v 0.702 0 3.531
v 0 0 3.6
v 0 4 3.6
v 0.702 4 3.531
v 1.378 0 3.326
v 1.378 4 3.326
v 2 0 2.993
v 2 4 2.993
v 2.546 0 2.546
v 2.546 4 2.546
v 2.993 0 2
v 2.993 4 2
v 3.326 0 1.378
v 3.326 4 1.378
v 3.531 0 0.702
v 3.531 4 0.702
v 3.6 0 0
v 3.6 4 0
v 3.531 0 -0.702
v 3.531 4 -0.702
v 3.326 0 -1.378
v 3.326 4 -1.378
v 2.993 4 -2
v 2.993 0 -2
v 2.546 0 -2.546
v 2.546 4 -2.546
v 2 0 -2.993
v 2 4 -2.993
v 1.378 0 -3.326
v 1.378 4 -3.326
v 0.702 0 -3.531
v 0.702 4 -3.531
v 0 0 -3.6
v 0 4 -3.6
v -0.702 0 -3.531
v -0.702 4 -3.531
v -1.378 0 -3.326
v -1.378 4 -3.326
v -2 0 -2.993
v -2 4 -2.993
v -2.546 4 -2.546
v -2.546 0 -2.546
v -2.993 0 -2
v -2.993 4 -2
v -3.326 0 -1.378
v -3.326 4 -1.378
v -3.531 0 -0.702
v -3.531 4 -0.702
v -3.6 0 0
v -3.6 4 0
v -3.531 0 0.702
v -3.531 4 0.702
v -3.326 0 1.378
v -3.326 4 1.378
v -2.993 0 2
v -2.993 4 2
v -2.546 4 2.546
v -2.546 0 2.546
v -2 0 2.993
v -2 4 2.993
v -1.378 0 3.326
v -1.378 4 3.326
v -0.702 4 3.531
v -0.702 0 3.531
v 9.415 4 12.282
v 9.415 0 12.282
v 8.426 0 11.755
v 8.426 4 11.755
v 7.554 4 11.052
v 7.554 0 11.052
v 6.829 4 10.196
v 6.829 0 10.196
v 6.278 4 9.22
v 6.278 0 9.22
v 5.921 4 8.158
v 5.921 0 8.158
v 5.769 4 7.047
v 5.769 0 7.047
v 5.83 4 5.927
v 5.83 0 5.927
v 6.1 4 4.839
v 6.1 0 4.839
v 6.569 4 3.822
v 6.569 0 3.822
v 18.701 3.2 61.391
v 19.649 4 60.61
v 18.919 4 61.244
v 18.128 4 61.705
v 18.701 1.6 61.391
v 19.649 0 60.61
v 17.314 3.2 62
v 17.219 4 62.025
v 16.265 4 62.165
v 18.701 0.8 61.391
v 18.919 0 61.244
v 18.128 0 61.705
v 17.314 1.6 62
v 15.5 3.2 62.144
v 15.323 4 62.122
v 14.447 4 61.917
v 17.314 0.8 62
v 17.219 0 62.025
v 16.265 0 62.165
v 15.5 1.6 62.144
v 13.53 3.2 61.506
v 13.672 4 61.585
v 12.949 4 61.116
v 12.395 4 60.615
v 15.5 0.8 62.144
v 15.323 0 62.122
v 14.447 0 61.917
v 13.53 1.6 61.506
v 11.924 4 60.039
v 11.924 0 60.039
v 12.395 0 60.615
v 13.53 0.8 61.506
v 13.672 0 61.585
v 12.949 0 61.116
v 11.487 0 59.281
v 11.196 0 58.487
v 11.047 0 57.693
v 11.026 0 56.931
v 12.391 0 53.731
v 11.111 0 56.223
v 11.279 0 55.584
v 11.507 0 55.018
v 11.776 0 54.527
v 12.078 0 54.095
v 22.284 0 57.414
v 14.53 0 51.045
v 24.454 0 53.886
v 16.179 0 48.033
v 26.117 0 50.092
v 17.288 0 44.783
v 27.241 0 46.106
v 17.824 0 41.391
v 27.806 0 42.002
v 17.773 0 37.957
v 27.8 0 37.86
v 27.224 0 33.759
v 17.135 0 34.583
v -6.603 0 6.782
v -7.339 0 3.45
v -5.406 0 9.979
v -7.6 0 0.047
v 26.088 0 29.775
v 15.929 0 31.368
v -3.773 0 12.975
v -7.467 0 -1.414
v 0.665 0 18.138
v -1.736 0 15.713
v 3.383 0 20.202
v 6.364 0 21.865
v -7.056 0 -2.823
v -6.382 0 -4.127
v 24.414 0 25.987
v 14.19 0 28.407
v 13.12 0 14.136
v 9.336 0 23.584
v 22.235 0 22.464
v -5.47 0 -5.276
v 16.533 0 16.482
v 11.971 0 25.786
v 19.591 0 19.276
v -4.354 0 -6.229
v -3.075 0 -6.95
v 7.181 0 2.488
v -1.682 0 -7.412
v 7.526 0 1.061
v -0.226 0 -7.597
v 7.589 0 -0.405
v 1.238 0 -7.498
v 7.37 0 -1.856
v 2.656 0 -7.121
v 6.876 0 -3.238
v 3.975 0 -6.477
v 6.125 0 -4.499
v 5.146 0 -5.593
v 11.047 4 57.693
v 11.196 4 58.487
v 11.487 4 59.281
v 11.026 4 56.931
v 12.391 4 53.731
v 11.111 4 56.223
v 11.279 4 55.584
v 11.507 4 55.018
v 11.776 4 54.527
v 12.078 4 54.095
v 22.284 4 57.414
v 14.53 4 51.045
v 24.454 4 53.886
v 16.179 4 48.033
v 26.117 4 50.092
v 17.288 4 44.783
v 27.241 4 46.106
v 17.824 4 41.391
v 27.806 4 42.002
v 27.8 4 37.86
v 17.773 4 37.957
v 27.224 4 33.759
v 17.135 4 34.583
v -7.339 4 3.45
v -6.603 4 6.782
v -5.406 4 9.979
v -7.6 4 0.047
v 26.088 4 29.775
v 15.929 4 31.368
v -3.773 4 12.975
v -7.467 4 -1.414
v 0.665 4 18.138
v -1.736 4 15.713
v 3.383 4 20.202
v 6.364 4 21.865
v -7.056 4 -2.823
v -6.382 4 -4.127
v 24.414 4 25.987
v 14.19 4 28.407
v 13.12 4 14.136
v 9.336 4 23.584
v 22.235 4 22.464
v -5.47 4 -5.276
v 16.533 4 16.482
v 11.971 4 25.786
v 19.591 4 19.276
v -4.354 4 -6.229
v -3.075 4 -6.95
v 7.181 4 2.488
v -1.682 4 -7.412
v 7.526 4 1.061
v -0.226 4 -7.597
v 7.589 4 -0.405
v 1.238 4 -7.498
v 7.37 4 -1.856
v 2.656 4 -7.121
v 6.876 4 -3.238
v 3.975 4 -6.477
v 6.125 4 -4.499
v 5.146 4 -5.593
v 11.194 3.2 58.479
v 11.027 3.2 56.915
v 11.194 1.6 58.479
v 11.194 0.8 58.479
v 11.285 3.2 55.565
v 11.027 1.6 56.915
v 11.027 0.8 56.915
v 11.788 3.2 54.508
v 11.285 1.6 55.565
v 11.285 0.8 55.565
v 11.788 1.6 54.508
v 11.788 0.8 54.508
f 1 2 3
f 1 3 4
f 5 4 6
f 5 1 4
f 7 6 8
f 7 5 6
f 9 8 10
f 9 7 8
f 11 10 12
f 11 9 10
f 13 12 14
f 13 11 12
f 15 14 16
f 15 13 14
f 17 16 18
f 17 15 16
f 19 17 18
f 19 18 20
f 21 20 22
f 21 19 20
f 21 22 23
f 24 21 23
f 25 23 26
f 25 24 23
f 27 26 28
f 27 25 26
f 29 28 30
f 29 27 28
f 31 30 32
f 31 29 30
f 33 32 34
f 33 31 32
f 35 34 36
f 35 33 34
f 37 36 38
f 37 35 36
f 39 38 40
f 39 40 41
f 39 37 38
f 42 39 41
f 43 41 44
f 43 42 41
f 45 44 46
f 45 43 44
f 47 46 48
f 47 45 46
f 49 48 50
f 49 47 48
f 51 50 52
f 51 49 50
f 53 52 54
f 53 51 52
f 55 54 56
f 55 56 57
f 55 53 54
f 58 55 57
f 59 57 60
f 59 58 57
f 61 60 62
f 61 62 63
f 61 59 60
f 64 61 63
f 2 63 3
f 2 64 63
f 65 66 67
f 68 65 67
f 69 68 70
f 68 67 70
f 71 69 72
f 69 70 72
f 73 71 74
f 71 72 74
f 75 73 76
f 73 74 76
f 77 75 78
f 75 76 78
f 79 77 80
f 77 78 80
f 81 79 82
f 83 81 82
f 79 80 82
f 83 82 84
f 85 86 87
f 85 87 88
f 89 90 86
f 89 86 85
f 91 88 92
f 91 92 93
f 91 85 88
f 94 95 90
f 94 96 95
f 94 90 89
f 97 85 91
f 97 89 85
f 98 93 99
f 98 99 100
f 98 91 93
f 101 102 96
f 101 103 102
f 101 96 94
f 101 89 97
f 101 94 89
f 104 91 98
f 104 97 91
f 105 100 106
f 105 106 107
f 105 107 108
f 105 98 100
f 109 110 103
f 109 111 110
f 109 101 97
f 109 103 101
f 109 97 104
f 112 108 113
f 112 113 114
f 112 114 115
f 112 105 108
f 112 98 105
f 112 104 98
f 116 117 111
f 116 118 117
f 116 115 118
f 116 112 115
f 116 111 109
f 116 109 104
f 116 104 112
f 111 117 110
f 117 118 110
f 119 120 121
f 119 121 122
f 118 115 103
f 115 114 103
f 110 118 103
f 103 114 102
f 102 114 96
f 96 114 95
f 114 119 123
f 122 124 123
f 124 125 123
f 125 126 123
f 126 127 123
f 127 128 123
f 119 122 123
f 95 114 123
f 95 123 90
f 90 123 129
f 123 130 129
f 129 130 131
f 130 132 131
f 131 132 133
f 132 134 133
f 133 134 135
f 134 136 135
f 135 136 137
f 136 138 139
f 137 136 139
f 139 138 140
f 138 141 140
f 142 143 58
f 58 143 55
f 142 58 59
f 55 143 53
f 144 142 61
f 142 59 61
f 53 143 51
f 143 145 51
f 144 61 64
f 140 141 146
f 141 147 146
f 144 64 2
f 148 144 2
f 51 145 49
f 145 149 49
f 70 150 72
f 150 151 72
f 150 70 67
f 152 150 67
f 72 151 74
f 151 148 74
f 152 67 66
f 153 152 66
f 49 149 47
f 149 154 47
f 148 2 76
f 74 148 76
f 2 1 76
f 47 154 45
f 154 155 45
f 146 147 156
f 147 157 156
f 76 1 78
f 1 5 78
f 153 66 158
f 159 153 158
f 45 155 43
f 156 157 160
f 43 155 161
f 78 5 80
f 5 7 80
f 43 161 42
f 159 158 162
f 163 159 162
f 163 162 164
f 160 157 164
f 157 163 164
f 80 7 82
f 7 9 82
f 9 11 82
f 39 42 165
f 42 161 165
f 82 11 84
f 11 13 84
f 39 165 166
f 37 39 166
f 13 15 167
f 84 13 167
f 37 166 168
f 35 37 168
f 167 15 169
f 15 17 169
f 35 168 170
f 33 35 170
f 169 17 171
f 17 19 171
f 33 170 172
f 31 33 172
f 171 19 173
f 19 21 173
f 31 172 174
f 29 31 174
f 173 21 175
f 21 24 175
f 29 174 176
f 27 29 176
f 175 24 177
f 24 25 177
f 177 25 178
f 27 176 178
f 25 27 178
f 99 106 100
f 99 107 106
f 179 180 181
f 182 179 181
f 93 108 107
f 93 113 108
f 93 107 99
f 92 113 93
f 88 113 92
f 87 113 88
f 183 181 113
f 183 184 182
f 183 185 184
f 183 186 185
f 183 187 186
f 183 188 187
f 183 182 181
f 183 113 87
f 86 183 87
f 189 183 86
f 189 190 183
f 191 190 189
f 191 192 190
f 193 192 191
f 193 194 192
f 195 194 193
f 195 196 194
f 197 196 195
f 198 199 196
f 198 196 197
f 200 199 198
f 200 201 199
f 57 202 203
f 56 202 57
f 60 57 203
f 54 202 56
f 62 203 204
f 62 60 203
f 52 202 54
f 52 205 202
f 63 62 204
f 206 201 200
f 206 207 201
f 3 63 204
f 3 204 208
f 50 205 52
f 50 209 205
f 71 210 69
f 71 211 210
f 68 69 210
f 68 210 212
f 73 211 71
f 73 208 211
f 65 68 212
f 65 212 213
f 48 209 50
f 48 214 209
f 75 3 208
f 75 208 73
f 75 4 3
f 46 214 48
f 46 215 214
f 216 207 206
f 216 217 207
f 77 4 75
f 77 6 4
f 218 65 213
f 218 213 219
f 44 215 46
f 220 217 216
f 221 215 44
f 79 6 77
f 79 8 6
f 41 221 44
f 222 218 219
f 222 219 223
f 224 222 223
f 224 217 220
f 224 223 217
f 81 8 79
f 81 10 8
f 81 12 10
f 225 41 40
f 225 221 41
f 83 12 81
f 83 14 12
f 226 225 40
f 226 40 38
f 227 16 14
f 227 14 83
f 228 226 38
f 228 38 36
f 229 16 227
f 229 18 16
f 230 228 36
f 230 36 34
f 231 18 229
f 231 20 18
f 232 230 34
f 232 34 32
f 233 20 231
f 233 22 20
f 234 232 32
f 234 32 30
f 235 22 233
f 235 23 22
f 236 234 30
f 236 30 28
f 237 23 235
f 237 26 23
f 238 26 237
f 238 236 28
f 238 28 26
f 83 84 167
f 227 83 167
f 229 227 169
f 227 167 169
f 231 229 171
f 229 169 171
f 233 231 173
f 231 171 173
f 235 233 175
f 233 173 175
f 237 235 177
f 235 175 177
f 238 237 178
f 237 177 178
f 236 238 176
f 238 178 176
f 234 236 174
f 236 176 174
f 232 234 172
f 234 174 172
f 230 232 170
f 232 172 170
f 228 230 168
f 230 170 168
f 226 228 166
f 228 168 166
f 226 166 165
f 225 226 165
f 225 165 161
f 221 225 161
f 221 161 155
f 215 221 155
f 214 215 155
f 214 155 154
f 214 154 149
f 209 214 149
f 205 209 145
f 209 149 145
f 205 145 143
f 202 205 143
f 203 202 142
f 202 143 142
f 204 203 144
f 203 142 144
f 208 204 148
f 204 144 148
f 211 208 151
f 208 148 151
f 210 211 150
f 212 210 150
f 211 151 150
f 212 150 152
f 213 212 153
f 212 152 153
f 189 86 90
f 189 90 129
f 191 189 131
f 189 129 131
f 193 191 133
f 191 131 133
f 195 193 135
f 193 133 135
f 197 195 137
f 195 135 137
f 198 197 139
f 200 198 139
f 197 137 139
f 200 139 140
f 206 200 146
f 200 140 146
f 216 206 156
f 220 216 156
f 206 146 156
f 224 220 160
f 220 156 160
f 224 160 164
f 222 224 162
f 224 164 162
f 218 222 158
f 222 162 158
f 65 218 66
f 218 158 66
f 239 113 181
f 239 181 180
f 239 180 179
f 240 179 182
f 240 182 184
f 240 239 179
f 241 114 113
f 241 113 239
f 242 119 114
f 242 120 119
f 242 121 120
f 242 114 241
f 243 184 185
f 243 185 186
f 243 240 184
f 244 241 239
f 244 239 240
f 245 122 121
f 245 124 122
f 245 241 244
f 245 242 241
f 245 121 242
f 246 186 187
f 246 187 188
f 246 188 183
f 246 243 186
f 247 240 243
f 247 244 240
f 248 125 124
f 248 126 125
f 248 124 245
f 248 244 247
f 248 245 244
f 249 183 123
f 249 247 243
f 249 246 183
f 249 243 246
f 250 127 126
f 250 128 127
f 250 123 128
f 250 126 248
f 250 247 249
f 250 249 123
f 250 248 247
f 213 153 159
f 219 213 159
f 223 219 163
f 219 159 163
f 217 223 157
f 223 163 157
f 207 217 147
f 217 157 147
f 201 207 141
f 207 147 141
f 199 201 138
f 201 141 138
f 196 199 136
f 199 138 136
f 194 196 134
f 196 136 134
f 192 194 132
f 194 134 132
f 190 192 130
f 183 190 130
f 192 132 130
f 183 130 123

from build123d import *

# Parameters (mm, degrees)
SKETCH1_R           = 3.6
BOSS_EXTRUDE1_DEPTH = 4
FILLET1_DEPTH       = 4


with BuildPart() as part:
    # Sketch1 → Boss-Extrude1 (new body)
    with BuildSketch(Plane(origin=(0, 0, 0), x_dir=(1, 0, 0), z_dir=(0, 1, 0))):
        with BuildLine():
            Line((9.346086984, -56.356572977), (15.081851343, -64.548093422))
            ThreePointArc((15.081851343, -64.548093422), (27.699790534, -36.740032424), (9.415453774, -12.282238674))
            ThreePointArc((9.415453774, -12.282238674), (6.074212989, -8.697213495), (6.569252548, -3.821638518))
            ThreePointArc((6.569252548, -3.821638518), (1.956261977, 7.343911701), (-7.599852871, -0.04729001))
            ThreePointArc((-7.599852871, -0.04729001), (-3.773263774, -12.975309302), (6.3636811, -21.864562113))
            ThreePointArc((6.3636811, -21.864562113), (17.800210223, -38.250629299), (9.346086984, -56.356572977))
        make_face()
        with Locations(Location((0, 0, 0), (0, 0, 270))):
            Circle(SKETCH1_R, mode=Mode.SUBTRACT)
    extrude(amount=BOSS_EXTRUDE1_DEPTH)

    # Fillet1: read off the stored shape, not the designer's step
    # Fillet1 outline → Fillet1 (cut)
    with BuildSketch(Plane(origin=(0, 0, 0), x_dir=(1, 0, 0), z_dir=(0, 1, 0))):
        with BuildLine():
            ThreePointArc((15.081851343, -64.548093422), (17.464679897, -62.694164436), (19.649105693, -60.610127838))
            add(Edge.make_bspline(
                [(19.649105693, -60.610127838), (18.677855173, -61.634935456), (17.188222286, -62.496348841), (15.223722909, -62.743763995), (13.23213393, -61.906423138), (11.924254263, -60.03857744)],
                knots=[0, 0, 0, 0, 0, 0, 0.550510254, 0.550510254, 0.550510254, 0.550510254, 0.550510254, 0.550510254], degree=5, weights=[1, 0.779795898, 0.620204104, 0.521224619, 0.482857441, 0.505102571]))
            Line((11.924254263, -60.03857744), (15.081851343, -64.548093422))
        make_face()
        with BuildLine():
            Line((9.346086984, -56.356572977), (11.924254263, -60.03857744))
            add(Edge.make_bspline(
                [(11.924254263, -60.03857744), (10.93883994, -58.631259971), (10.675135711, -57.05607025), (10.993827945, -55.636809597), (11.636969564, -54.526791063), (12.390923216, -53.731262588)],
                knots=[0.550510254, 0.550510254, 0.550510254, 0.550510254, 0.550510254, 0.550510254, 1, 1, 1, 1, 1, 1], degree=5, weights=[0.505102571, 0.523265645, 0.581836924, 0.68081641, 0.820204102, 1]))
            ThreePointArc((12.390923216, -53.731262588), (10.934639353, -55.12062032), (9.346086984, -56.356572977))
        make_face()
    extrude(amount=FILLET1_DEPTH, mode=Mode.SUBTRACT)


solid = part.part
